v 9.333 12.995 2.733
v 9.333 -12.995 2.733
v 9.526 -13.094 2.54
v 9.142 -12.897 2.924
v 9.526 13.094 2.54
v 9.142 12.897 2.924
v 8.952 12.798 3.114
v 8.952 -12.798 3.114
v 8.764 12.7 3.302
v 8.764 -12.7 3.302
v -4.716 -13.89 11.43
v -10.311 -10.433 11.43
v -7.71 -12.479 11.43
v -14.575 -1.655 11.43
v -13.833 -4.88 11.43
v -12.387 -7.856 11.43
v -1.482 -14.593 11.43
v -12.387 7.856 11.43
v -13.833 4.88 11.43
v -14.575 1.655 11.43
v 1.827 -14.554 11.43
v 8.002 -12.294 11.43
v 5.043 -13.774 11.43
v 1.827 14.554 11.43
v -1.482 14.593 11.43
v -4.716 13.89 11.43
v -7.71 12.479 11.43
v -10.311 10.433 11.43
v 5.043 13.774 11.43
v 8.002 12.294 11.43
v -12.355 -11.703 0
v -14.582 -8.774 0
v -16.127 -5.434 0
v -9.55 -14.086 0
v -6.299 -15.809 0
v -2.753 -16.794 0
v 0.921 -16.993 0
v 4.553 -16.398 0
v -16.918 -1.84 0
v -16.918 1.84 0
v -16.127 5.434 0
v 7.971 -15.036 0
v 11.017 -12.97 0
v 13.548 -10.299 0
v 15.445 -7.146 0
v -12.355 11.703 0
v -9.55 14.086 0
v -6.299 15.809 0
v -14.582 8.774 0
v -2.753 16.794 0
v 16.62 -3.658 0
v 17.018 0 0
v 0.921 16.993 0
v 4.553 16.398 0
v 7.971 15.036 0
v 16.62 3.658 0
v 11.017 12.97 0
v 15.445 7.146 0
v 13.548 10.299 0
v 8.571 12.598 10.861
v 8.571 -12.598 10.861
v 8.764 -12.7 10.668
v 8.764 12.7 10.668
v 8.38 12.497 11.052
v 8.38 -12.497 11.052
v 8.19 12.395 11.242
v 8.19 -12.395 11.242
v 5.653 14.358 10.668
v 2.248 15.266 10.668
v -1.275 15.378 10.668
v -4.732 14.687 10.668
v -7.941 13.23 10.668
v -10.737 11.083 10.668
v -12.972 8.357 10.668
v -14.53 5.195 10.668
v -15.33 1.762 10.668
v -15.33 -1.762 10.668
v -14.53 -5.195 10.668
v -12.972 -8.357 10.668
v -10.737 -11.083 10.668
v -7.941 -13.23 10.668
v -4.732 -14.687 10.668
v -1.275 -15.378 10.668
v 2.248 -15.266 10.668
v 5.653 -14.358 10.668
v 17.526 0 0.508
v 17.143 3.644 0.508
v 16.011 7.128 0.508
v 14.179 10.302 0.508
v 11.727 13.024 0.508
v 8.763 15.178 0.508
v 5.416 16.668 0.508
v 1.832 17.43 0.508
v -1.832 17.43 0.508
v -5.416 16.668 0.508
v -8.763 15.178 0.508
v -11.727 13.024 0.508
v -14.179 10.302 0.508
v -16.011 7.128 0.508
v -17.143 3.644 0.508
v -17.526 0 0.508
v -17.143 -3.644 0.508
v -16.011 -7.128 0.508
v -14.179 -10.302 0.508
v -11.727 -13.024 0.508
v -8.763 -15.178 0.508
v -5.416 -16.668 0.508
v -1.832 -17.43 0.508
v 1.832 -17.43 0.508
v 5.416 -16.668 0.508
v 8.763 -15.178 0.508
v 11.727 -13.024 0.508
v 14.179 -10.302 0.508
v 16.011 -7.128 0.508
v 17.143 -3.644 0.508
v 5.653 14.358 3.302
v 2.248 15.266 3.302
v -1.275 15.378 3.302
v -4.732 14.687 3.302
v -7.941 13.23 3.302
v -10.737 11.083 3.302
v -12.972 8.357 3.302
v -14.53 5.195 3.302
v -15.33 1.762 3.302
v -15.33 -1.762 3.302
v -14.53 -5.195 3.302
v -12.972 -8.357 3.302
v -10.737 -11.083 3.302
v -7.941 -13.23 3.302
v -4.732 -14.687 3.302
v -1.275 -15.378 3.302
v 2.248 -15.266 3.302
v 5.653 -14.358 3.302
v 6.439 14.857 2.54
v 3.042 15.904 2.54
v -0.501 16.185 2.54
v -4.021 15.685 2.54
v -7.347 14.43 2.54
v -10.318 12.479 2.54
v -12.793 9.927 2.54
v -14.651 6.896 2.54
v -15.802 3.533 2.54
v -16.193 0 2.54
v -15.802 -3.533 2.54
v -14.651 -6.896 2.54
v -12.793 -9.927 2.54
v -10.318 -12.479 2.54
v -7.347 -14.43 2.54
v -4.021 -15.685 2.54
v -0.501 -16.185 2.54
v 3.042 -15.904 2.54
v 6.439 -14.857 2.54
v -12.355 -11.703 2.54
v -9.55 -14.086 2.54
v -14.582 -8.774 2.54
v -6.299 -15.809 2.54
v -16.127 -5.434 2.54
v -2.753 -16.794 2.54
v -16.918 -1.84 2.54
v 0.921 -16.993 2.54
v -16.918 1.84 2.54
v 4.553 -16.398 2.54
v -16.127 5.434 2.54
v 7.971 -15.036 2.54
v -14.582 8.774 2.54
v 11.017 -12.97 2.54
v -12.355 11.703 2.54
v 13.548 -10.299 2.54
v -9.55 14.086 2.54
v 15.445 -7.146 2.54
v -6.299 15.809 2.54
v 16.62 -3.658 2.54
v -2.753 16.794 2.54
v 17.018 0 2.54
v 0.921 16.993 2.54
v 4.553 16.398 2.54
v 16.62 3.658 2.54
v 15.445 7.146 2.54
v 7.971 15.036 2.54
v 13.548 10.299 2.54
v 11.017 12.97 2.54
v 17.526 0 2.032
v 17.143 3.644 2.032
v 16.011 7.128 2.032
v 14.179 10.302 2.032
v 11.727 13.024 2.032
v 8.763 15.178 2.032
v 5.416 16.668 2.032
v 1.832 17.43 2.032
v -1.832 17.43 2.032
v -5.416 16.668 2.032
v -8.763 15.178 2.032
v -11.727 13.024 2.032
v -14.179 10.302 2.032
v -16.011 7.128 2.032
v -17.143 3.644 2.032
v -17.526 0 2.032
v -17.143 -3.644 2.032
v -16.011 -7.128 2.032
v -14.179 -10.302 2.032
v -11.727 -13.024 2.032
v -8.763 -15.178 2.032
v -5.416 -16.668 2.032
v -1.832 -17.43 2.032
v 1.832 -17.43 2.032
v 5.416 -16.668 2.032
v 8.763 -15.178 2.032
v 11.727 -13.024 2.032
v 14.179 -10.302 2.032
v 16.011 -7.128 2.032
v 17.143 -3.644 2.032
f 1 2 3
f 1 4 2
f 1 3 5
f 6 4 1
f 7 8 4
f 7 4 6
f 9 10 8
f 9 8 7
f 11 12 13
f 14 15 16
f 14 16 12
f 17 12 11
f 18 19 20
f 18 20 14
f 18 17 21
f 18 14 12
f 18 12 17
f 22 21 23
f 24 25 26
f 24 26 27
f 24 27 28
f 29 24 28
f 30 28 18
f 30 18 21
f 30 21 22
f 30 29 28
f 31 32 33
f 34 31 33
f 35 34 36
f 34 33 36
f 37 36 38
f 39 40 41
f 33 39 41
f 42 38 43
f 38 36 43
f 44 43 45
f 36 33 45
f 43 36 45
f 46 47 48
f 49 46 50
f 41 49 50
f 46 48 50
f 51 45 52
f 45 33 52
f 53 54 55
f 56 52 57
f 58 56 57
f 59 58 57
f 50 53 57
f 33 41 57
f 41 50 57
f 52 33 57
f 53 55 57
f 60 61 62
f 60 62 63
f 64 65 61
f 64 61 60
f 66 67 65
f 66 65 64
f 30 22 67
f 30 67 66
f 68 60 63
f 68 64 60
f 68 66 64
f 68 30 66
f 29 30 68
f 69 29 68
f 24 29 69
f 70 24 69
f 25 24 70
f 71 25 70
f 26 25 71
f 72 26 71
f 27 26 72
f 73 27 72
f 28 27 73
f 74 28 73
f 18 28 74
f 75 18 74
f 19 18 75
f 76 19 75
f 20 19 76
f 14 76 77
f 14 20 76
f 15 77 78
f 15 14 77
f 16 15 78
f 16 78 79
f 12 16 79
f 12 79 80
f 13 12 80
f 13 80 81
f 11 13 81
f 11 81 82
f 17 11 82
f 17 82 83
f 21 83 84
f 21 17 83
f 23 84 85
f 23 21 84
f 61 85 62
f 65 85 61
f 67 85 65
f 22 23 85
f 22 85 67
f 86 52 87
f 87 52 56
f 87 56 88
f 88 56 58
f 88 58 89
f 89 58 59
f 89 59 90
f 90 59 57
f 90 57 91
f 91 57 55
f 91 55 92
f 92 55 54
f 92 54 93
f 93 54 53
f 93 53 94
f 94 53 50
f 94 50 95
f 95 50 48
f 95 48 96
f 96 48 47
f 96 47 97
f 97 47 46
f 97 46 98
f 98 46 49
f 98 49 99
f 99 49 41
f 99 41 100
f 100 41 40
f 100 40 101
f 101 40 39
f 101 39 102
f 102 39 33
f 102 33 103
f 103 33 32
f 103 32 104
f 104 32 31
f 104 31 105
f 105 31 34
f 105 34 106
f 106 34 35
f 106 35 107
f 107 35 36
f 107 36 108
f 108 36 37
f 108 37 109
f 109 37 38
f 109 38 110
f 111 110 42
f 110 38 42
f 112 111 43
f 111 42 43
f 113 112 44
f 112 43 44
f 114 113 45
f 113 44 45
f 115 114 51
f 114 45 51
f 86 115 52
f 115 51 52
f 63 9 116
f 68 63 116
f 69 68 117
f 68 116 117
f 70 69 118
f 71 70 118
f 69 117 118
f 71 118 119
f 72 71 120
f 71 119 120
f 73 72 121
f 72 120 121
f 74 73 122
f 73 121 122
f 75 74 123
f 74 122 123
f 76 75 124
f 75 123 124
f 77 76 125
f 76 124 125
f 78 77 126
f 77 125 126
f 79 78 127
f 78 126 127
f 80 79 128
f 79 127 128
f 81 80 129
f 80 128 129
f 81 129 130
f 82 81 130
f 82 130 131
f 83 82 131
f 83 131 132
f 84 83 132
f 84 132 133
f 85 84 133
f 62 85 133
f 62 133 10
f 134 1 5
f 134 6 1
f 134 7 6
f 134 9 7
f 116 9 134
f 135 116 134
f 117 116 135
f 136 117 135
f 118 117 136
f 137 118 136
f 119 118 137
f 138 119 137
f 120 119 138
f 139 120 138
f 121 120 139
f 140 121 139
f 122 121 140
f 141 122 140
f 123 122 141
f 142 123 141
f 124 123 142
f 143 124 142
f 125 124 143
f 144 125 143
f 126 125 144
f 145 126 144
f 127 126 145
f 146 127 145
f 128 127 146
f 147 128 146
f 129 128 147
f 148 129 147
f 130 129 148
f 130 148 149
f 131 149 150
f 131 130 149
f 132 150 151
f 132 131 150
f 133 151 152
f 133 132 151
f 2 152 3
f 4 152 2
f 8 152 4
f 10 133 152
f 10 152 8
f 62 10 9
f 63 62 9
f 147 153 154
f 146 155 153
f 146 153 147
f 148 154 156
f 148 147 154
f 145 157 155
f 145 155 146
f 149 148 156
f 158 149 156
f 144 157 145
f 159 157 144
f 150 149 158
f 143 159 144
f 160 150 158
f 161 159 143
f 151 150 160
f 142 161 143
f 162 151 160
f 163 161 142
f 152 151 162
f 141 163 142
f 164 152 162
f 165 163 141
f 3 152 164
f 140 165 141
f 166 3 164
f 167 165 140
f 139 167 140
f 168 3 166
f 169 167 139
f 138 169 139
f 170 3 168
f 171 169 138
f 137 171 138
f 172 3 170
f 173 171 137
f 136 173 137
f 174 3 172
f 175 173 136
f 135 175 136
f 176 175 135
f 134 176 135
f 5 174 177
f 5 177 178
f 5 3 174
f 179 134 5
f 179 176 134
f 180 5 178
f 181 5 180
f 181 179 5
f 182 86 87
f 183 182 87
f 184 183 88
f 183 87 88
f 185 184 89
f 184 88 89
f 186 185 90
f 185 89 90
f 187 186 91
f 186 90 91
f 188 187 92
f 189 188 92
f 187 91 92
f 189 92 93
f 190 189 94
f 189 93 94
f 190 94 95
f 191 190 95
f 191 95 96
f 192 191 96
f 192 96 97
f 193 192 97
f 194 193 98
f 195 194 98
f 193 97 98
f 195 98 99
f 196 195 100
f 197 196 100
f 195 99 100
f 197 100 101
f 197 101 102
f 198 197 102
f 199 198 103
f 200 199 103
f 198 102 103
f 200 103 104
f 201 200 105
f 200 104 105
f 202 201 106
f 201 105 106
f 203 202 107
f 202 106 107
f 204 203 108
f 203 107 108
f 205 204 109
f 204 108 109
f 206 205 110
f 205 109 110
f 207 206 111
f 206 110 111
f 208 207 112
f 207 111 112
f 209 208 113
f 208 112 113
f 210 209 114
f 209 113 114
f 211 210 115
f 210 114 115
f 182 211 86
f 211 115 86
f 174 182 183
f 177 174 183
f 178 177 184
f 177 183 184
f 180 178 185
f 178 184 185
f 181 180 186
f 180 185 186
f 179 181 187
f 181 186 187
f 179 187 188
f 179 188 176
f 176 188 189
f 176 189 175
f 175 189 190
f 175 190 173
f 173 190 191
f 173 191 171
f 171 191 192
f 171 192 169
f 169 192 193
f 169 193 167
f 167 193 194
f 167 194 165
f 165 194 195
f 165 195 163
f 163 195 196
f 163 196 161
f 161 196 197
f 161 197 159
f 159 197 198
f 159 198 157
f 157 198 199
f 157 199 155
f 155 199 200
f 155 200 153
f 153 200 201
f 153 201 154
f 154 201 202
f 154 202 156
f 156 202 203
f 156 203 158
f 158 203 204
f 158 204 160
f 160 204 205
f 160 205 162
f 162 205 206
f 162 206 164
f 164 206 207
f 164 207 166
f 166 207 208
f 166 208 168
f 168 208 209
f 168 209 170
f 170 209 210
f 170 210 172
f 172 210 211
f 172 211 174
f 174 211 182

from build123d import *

# Parameters (mm, degrees)
F0_R     = 17.526
F1_DEPTH = 2.54
F3_DEPTH = 8.89
F4_SIZE  = 0.762
F5_SIZE  = 0.508


with BuildPart() as f1:
    # F0 (on Top) → F1 (new body)
    with BuildSketch(Plane.XY):
        Circle(F0_R)
    extrude(amount=F1_DEPTH)

    # F2 (on face) → F3 (join)
    with BuildSketch(Plane.XY.offset(2.54)):
        with BuildLine():
            Line((8.76415, -12.7), (8.76415, 12.7))
            ThreePointArc((8.76415, 12.7), (-15.4305, 0), (8.76415, -12.7))
        make_face()
    extrude(amount=F3_DEPTH)

    # F4
    f4_edges = [f1.edges().sort_by_distance(p)[0] for p in [
        (-15.4305, 0, 11.43),
        (8.76415, 0, 11.43),
        (8.76415, 0, 2.54),
        (-15.4305, 0, 2.54),
    ]]
    chamfer(f4_edges, length=F4_SIZE)

    # F5
    f5_edges = [f1.edges().sort_by_distance(p)[0] for p in [
        (-17.526, 0, 2.54),
        (-17.526, 0, 0),
    ]]
    chamfer(f5_edges, length=F5_SIZE)


solid = f1.part
